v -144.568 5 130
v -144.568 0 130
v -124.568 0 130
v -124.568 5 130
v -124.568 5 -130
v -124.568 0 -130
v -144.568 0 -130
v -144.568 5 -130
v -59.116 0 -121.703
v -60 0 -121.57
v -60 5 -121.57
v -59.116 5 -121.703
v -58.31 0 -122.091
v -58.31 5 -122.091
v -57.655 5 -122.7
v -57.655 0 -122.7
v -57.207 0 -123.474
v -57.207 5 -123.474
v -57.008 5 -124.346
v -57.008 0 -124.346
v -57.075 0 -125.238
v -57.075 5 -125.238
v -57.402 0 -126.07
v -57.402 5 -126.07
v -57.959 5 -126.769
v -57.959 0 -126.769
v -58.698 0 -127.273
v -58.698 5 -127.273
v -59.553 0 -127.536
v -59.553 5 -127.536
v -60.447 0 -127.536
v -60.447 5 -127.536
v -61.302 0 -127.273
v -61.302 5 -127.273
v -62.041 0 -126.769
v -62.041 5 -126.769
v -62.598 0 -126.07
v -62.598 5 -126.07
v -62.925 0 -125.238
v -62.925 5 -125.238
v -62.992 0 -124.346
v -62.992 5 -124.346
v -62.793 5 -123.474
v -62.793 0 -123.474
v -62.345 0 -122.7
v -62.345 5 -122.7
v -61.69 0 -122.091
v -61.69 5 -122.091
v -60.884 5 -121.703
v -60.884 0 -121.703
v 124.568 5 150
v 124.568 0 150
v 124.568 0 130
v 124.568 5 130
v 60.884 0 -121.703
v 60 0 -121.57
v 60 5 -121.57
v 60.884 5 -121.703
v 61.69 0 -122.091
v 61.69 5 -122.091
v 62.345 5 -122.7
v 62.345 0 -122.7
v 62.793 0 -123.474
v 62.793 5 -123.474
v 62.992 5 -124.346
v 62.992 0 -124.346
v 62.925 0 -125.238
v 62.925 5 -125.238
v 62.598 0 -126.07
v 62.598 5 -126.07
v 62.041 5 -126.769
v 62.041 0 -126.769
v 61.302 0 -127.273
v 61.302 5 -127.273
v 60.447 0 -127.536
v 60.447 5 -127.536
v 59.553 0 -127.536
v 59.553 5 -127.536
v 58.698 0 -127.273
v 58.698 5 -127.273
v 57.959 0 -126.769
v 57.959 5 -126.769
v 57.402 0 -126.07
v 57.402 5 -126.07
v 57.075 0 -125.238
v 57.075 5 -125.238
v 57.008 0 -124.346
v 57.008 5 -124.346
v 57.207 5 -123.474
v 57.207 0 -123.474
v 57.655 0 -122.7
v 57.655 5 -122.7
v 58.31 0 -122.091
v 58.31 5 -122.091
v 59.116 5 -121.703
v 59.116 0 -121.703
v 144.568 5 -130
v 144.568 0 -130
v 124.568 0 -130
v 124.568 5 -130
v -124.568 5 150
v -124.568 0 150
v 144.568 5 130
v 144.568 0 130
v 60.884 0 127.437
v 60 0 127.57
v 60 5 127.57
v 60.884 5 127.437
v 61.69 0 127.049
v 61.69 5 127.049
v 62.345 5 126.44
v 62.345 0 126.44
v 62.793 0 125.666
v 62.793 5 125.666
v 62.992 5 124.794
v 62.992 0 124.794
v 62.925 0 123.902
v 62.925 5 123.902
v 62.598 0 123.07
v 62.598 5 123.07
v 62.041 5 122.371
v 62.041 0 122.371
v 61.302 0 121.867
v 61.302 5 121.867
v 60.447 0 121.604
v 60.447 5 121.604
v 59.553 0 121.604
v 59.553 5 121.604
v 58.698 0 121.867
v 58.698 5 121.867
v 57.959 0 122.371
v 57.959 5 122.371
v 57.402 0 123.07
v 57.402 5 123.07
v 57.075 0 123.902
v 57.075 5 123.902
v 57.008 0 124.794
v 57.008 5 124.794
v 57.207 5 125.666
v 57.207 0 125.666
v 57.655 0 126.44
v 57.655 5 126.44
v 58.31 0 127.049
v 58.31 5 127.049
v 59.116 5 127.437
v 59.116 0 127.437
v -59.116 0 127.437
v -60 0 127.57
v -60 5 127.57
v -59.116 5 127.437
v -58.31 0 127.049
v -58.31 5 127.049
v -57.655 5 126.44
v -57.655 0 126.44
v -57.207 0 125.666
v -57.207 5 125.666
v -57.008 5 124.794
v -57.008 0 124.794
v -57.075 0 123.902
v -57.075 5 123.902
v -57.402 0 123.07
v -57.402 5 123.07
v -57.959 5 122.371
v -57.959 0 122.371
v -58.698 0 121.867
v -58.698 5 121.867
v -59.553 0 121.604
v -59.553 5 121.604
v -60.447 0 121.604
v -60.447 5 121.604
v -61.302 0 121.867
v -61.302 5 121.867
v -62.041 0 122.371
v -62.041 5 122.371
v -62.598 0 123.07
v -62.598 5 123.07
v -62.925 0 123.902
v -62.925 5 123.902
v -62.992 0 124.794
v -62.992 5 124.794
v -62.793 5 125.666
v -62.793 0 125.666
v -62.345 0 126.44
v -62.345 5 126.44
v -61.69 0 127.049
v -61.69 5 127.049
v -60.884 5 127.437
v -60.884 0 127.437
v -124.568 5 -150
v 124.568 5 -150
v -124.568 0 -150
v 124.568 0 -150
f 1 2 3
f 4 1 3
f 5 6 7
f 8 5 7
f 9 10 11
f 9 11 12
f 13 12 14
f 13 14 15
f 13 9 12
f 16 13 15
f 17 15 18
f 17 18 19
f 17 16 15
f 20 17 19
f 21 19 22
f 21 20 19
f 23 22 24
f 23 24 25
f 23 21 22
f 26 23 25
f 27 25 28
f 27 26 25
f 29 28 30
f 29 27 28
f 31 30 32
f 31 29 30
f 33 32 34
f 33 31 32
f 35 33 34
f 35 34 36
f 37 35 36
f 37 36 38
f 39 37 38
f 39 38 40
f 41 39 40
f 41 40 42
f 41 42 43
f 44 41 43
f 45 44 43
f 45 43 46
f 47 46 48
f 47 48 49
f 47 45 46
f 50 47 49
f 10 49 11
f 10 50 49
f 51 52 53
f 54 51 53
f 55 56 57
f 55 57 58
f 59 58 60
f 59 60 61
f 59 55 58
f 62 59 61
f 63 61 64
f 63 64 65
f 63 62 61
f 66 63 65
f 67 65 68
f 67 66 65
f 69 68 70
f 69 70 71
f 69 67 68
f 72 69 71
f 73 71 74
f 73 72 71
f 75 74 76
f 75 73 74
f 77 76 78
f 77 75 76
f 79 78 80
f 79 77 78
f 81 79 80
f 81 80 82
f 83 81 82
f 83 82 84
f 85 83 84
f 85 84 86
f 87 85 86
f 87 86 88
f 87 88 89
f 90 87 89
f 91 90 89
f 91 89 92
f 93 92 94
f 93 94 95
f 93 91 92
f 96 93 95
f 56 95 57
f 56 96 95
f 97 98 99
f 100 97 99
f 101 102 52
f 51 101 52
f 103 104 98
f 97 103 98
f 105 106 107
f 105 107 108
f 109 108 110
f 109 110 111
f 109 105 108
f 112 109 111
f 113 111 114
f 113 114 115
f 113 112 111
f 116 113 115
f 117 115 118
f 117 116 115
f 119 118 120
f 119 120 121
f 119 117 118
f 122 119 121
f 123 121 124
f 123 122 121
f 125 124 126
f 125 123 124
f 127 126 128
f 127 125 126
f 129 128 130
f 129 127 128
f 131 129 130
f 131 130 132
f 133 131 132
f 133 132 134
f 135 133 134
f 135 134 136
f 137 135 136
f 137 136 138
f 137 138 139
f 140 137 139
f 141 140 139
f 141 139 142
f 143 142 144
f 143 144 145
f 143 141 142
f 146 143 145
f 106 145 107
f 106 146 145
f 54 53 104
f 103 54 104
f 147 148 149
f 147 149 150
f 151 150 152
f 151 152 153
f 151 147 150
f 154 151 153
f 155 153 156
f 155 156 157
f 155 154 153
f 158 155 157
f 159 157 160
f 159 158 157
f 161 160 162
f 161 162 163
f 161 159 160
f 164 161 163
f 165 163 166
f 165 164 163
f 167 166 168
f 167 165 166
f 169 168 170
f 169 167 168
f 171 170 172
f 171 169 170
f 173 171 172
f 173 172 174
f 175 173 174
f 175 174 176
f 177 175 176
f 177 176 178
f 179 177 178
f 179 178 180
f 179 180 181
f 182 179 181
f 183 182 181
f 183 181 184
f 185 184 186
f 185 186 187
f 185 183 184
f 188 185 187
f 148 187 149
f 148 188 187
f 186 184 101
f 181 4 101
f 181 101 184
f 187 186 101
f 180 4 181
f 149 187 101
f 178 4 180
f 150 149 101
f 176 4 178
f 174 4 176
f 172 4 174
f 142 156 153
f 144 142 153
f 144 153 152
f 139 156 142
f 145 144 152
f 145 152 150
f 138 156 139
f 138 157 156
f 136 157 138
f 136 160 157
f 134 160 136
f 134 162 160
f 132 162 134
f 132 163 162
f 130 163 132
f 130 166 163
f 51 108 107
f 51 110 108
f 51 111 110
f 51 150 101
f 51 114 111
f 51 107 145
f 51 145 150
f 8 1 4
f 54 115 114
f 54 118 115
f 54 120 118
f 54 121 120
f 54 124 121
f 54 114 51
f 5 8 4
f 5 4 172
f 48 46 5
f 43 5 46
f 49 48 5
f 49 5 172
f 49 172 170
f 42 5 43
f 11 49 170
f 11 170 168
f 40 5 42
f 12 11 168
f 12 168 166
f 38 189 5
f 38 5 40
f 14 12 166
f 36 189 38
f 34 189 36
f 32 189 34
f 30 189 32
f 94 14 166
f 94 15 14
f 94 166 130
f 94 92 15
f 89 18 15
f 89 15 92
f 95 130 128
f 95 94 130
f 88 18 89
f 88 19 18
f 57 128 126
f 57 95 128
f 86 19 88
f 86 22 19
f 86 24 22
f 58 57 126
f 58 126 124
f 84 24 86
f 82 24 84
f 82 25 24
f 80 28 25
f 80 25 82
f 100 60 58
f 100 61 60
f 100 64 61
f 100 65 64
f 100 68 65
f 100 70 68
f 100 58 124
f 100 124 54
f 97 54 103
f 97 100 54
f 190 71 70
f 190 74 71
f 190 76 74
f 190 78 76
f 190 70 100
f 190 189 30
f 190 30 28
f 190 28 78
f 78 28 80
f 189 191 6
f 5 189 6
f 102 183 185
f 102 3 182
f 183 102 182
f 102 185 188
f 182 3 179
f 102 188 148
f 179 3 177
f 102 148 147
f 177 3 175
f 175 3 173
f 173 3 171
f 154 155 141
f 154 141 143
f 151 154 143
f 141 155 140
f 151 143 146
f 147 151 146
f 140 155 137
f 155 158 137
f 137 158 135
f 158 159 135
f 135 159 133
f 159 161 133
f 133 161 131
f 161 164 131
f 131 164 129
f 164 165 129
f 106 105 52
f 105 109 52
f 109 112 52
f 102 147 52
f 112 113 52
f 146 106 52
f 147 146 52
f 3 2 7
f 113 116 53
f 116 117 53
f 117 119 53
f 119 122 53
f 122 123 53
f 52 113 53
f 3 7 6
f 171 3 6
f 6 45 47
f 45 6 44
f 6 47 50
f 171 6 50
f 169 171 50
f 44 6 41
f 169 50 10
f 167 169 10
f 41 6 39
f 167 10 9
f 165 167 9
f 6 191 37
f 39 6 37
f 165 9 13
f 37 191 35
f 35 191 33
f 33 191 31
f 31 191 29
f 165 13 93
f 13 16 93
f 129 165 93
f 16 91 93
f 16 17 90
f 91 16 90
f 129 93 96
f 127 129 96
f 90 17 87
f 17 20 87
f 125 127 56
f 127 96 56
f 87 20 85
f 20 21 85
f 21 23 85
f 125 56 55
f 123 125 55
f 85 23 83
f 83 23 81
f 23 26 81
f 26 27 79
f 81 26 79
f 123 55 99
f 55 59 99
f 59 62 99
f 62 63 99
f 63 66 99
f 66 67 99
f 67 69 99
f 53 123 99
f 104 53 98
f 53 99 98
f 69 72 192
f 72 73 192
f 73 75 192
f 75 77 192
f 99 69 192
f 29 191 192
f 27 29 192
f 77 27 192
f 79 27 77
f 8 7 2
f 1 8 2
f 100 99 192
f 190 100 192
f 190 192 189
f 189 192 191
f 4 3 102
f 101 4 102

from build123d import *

# Parameters (mm, degrees)
ESQUISSE1_R        = 3
ESQUISSE1_W        = 40
ESQUISSE1_H        = 80
BOSS_EXTRU_1_DEPTH = 5


with BuildPart() as part:
    # Esquisse1 → Boss.-Extru.1 (new body)
    # profile 1 of 7: a face of its own
    with BuildSketch(Plane(origin=(0, 0, 0), x_dir=(1, 0, 0), z_dir=(0, 1, 0))):
        with BuildLine():
            Line((-144.568322948, 130), (-144.568322948, 40))
            ThreePointArc((-144.568322948, 40), (-90.829510466, 119.373363982), (3.94e-07, 150))
            Line((3.94e-07, 150), (-124.568322948, 150))
            Line((-124.568322948, 150), (-124.568322948, 130))
            Line((-124.568322948, 130), (-144.568322948, 130))
        make_face()
    # profile 2 of 7: a face of its own
    with BuildSketch(Plane(origin=(0, 0, 0), x_dir=(1, 0, 0), z_dir=(0, 1, 0))):
        with BuildLine():
            ThreePointArc((3.94e-07, 150), (-90.829510466, 119.373363982), (-144.568322948, 40))
            Line((-144.568322948, 40), (-104.568322948, 40))
            Line((-104.568322948, 40), (-104.568322948, -40))
            Line((-104.568322948, -40), (-144.568322948, -40))
            ThreePointArc((-144.568322948, -40), (-90.829510457, -119.373363989), (4.17e-07, -150))
            ThreePointArc((4.17e-07, -150), (90.829510789, -119.373363737), (144.568322948, -40))
            Line((144.568322948, -40), (104.568322948, -40))
            Line((104.568322948, -40), (104.568322948, 40))
            Line((104.568322948, 40), (144.568322948, 40))
            ThreePointArc((144.568322948, 40), (90.82951078, 119.373363744), (3.94e-07, 150))
        make_face()
        with Locations(Location((-60, -124.57, 0), (0, 0, 270))):
            Circle(ESQUISSE1_R, mode=Mode.SUBTRACT)
        with Locations(Location((60, -124.57, 0), (0, 0, 270))):
            Circle(ESQUISSE1_R, mode=Mode.SUBTRACT)
        with Locations(Location((-60, 124.57, 0), (0, 0, 270))):
            Circle(ESQUISSE1_R, mode=Mode.SUBTRACT)
        with Locations(Location((60, 124.57, 0), (0, 0, 270))):
            Circle(ESQUISSE1_R, mode=Mode.SUBTRACT)
    # profile 3 of 7: a face of its own
    with BuildSketch(Plane(origin=(0, 0, 0), x_dir=(1, 0, 0), z_dir=(0, 1, 0))):
        with BuildLine():
            ThreePointArc((4.17e-07, -150), (-90.829510457, -119.373363989), (-144.568322948, -40))
            Line((-144.568322948, -40), (-144.568322948, -130))
            Line((-144.568322948, -130), (-124.568322948, -130))
            Line((-124.568322948, -130), (-124.568322948, -150))
            Line((-124.568322948, -150), (4.17e-07, -150))
        make_face()
    # profile 4 of 7: a face of its own
    with BuildSketch(Plane(origin=(0, 0, 0), x_dir=(1, 0, 0), z_dir=(0, 1, 0))):
        with BuildLine():
            ThreePointArc((144.568322948, -40), (90.829510789, -119.373363737), (4.17e-07, -150))
            Line((4.17e-07, -150), (124.568322948, -150))
            Line((124.568322948, -150), (124.568322948, -130))
            Line((124.568322948, -130), (144.568322948, -130))
            Line((144.568322948, -130), (144.568322948, -40))
        make_face()
    # profile 5 of 7: a face of its own
    with BuildSketch(Plane(origin=(0, 0, 0), x_dir=(1, 0, 0), z_dir=(0, 1, 0))):
        with BuildLine():
            Line((124.568322948, 150), (3.94e-07, 150))
            ThreePointArc((3.94e-07, 150), (90.82951078, 119.373363744), (144.568322948, 40))
            Line((144.568322948, 40), (144.568322948, 130))
            Line((144.568322948, 130), (124.568322948, 130))
            Line((124.568322948, 130), (124.568322948, 150))
        make_face()
    # profile 6 of 7: a face of its own
    with BuildSketch(Plane(origin=(0, 0, 0), x_dir=(1, 0, 0), z_dir=(0, 1, 0))):
        with Locations((-124.568322948, 0)):
            Rectangle(ESQUISSE1_W, ESQUISSE1_H)
    # profile 7 of 7: a face of its own
    with BuildSketch(Plane(origin=(0, 0, 0), x_dir=(1, 0, 0), z_dir=(0, 1, 0))):
        with Locations((124.568322948, 0)):
            Rectangle(ESQUISSE1_W, ESQUISSE1_H)
    extrude(amount=BOSS_EXTRU_1_DEPTH)


solid = part.part
